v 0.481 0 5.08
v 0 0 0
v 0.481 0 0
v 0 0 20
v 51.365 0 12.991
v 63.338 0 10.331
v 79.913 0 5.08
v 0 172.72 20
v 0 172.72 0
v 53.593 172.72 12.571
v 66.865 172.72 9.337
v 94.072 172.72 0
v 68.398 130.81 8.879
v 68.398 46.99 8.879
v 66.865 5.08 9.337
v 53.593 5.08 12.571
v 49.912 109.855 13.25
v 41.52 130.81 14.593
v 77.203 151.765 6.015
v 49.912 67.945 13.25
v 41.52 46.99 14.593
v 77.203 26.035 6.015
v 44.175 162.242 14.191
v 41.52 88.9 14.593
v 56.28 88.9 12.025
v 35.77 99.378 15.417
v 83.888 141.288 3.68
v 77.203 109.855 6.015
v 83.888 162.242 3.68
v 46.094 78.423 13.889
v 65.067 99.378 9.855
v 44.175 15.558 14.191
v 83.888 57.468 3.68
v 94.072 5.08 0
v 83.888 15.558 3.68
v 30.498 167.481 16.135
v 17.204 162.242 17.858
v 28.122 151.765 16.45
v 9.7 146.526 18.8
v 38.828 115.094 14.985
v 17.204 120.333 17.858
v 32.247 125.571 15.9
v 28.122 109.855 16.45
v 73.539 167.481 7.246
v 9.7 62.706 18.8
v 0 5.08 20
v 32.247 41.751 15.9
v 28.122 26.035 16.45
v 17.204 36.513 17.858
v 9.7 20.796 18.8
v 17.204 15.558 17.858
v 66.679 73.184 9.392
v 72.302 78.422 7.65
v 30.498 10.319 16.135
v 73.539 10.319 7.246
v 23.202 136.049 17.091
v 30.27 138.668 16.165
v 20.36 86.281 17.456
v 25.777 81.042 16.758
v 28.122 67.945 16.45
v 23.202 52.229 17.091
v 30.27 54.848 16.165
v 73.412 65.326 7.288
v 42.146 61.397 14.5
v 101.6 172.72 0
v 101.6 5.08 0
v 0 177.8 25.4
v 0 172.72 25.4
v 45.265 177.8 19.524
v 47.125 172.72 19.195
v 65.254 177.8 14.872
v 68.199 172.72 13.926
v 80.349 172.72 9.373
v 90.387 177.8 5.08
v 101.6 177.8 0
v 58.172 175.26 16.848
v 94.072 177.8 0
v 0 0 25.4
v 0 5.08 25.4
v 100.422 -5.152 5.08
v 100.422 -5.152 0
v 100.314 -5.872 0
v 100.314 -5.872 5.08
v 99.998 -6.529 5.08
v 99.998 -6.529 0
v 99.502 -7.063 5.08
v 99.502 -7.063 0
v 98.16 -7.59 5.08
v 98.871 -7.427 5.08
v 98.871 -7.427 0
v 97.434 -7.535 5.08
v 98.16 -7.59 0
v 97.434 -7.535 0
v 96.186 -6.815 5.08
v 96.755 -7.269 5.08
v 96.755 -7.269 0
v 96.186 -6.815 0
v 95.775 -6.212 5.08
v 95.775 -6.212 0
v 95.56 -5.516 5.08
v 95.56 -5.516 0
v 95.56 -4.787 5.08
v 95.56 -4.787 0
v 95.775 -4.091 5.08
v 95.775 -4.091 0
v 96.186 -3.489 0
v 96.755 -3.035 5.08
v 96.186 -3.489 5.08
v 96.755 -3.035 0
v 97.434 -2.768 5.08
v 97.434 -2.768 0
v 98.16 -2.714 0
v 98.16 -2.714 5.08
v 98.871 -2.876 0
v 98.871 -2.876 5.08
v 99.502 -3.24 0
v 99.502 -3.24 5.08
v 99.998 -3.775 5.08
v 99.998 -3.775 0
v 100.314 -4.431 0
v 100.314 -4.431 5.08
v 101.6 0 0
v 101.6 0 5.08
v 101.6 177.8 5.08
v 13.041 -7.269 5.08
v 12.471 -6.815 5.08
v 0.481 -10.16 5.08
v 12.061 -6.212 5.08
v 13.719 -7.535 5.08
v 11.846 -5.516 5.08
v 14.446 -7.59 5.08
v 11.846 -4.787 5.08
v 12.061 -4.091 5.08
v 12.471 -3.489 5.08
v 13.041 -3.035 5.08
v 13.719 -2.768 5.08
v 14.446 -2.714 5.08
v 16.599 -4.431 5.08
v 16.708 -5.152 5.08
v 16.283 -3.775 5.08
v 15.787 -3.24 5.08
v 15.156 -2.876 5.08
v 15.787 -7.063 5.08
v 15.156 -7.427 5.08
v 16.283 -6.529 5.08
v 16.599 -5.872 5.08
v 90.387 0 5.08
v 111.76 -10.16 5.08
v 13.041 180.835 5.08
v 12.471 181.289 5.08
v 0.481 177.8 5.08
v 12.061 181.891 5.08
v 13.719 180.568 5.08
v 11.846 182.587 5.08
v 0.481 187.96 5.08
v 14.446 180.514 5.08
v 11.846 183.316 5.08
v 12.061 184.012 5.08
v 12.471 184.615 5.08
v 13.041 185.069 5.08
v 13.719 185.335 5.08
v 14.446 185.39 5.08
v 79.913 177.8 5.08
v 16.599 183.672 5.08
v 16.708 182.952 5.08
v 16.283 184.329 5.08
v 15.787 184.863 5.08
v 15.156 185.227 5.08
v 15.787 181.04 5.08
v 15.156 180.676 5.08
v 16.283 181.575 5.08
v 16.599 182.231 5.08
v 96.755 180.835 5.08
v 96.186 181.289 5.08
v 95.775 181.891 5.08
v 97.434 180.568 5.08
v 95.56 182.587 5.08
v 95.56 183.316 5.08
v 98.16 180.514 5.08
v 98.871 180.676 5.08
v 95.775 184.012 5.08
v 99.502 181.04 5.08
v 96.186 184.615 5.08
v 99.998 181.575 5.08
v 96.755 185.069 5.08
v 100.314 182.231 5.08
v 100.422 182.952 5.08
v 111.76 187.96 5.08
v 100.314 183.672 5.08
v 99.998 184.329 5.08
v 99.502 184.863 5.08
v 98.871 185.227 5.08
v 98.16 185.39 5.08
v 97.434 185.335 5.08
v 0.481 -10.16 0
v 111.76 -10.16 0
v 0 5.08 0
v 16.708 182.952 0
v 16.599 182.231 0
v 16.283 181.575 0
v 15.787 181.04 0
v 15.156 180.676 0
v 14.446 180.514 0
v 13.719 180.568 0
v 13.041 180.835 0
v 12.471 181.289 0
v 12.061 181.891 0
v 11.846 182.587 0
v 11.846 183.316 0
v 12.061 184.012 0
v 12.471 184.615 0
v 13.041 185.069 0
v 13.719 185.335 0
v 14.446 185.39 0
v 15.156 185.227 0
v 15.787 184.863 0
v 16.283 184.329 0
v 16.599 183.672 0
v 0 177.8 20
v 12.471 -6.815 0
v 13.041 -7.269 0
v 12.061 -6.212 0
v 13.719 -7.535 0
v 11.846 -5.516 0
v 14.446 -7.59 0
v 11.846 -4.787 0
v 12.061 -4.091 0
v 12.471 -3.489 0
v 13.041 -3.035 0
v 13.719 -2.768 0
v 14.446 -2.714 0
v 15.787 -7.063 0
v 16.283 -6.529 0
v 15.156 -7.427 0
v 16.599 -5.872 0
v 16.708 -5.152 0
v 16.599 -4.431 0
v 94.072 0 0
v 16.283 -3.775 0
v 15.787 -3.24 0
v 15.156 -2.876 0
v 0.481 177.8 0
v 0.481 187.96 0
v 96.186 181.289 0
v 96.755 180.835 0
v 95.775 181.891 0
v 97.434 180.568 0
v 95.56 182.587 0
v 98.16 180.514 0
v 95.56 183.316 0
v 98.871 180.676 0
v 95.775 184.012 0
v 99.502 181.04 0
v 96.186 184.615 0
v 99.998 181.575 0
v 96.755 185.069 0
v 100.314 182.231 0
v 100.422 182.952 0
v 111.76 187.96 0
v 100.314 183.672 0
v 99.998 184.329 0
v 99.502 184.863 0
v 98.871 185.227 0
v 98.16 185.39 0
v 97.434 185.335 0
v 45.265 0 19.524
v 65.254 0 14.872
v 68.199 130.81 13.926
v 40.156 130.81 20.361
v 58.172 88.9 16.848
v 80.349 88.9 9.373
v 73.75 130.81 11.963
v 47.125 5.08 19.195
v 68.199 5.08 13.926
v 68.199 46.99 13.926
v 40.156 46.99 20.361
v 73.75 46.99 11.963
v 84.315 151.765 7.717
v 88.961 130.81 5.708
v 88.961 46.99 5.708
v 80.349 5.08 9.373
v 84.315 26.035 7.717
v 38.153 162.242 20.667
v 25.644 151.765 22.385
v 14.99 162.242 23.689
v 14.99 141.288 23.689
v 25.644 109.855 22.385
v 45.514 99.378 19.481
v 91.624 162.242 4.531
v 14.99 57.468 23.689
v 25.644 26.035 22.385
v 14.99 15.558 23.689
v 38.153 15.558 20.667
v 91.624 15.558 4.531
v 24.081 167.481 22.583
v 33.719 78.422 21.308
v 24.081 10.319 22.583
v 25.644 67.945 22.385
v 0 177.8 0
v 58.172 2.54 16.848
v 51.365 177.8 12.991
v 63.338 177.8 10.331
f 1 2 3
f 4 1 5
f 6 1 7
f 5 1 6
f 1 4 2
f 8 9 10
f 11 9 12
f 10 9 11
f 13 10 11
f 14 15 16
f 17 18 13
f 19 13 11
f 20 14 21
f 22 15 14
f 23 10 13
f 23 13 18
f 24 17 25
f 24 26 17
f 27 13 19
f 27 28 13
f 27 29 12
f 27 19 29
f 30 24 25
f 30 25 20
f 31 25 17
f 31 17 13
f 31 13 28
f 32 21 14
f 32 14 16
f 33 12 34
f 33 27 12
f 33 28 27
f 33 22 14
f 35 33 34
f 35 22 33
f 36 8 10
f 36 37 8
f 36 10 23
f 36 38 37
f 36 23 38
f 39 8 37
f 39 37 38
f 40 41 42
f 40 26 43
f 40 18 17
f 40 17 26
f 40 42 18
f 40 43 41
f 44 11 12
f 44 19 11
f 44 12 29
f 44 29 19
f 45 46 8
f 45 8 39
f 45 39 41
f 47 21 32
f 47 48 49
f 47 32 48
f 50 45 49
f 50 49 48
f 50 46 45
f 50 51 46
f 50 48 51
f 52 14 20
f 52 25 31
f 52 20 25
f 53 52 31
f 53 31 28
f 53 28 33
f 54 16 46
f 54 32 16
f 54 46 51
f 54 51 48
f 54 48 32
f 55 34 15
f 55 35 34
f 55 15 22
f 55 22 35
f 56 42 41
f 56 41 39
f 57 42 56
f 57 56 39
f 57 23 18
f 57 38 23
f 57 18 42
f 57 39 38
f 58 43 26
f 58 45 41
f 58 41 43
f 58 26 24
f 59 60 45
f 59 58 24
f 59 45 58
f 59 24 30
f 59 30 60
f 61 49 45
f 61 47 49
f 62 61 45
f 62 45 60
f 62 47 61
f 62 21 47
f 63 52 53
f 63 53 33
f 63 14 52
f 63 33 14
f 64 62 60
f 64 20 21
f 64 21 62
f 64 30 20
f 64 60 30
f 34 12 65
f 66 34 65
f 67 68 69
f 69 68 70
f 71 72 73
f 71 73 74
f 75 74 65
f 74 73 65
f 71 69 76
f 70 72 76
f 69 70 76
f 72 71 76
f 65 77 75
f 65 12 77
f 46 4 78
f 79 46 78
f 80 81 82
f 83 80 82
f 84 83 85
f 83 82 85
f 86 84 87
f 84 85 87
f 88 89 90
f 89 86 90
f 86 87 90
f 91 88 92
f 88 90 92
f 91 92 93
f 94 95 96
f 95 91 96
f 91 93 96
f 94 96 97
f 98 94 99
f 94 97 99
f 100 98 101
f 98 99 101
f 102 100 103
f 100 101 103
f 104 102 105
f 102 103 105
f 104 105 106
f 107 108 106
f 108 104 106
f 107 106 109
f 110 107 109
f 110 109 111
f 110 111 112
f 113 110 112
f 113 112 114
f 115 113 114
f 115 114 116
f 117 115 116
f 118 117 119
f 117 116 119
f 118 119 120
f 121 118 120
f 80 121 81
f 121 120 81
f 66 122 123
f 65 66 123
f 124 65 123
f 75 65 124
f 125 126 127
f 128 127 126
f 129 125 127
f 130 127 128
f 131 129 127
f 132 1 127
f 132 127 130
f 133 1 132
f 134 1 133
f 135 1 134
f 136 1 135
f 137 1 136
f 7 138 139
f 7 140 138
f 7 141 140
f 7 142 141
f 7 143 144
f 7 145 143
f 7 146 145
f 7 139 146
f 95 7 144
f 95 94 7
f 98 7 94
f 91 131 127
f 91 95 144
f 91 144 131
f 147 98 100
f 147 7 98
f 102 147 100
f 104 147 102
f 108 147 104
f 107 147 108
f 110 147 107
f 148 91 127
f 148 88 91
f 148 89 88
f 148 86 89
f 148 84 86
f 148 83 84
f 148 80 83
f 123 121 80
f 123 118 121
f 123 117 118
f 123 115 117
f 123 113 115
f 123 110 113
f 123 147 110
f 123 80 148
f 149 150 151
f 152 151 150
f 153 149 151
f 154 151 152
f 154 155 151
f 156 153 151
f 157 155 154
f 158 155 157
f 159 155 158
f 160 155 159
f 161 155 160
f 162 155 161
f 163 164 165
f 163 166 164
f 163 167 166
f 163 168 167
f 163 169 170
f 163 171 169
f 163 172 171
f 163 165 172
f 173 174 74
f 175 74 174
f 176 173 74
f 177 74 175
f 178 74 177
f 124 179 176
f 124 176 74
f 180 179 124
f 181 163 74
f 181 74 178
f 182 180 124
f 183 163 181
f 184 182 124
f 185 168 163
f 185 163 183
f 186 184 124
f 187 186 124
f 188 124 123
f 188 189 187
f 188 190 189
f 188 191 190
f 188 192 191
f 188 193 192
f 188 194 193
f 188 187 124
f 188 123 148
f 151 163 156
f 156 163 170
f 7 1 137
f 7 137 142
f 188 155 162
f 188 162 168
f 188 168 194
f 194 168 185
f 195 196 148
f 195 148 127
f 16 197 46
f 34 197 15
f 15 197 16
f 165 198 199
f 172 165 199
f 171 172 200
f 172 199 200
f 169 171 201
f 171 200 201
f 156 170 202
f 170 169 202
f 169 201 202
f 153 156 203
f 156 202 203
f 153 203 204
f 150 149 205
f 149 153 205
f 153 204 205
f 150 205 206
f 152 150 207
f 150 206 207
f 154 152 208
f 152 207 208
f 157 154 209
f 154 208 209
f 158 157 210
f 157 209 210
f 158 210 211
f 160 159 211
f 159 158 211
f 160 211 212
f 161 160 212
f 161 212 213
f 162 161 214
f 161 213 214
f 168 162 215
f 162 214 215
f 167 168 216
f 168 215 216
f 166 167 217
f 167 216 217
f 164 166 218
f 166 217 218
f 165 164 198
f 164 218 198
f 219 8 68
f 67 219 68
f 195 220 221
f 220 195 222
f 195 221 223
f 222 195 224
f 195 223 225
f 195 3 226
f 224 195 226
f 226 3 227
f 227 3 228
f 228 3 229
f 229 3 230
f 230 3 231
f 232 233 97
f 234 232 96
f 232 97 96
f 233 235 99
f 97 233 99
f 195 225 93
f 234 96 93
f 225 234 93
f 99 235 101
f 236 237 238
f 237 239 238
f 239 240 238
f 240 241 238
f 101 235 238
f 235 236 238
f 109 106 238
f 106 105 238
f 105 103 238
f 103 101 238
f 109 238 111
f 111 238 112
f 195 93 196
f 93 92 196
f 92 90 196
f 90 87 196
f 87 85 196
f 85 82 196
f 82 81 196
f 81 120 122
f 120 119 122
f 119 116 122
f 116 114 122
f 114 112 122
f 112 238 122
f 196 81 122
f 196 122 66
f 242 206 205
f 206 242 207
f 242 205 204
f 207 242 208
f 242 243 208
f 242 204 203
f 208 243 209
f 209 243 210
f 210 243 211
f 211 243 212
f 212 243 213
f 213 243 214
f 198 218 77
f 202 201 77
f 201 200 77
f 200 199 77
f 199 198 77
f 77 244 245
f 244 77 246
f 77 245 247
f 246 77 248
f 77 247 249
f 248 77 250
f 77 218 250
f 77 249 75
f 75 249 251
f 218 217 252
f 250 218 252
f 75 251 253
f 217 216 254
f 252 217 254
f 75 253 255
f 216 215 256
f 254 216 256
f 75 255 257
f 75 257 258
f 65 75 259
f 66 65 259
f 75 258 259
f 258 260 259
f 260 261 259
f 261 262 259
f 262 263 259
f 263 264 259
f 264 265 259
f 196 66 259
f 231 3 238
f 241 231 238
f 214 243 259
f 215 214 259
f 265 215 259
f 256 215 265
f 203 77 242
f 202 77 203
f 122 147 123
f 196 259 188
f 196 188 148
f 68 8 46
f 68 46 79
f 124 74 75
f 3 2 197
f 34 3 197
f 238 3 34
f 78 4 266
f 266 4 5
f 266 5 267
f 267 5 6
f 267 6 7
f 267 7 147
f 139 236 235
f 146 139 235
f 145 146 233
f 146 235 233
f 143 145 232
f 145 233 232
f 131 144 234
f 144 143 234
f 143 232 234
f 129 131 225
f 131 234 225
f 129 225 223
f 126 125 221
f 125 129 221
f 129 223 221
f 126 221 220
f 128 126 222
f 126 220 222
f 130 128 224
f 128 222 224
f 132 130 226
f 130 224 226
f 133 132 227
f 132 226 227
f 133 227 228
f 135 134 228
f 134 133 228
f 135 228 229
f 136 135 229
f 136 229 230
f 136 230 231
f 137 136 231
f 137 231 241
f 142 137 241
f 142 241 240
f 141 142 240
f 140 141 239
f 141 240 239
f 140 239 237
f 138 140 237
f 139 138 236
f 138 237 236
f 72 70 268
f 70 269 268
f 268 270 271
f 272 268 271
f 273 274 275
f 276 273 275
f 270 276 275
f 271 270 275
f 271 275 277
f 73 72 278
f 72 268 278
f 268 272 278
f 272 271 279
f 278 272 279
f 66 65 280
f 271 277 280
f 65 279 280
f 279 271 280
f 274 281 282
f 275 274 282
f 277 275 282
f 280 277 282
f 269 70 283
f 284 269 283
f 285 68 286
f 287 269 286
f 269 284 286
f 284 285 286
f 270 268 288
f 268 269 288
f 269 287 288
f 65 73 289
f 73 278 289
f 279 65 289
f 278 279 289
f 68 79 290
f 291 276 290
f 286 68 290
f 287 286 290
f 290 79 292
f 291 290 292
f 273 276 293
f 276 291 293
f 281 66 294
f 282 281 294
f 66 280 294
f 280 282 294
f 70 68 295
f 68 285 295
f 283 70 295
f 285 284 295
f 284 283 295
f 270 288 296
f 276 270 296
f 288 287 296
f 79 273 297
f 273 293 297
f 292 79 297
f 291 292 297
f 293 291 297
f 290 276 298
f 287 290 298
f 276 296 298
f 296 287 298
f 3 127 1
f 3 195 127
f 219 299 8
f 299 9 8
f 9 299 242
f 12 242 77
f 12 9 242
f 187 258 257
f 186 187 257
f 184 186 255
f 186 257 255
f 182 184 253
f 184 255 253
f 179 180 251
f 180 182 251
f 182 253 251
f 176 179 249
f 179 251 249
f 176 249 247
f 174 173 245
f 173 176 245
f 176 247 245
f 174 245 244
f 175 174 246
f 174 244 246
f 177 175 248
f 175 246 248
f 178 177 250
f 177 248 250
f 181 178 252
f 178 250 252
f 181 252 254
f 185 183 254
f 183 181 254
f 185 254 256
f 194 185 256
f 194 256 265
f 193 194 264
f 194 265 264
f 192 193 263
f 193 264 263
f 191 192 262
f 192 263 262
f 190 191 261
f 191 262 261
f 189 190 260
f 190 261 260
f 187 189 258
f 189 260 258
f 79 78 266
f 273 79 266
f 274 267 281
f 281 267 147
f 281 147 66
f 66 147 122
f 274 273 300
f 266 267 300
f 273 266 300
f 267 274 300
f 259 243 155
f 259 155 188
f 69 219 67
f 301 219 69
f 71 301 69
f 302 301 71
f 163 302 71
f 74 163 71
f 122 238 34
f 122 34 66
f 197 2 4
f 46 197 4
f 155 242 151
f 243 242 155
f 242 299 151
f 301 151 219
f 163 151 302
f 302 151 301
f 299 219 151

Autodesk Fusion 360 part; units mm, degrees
sketch "Sketch1" plane through (0, 0, 0) normal (0, 1, 0) x (1, 0, 0)
  line L0 (0, 0) -> (101.6, 0)
  line L1 (0, 0) -> (0, -25.4)
  spline S0 degree 2 poles (0, -25.4) (61.2882, -18.6006) (101.6, 0) knots 0 0 0 10.537877 10.537877 10.537877 weights 1 2.365825 1
  spline S1 degree 2 poles (0, -20) (59.3611, -12.7) (94.0715, 0) knots 0 0 0 9.650073 9.650073 9.650073 weights 1 3 1
  dimension "d1" = 101.6
  dimension "d2" = 25.4
extrude "Extrude1" add sketch "Sketch1" along normal blind 5.08 makes body 1
extrude "Extrude2" add sketch "Sketch1" along normal blind 177.8 separate body contours L0 L1 S0 S1 makes body 2
extrude "Extrude3" add sketch "Sketch1" along normal blind 5.08 from surface at 172.72 separate body makes body 3
sketch "Sketch2" plane through (0, 0, 0) normal (0, 0, 1) x (1, 0, 0)
  line L0 (0.4808, 187.96) -> (111.76, 187.96)
  line L1 (111.76, 187.96) -> (111.76, -10.16)
  line L2 (111.76, -10.16) -> (0.4808, -10.16)
  line L3 (0.4808, -10.16) -> (0.4808, 187.96)
  line L4 (0, 0) -> (0, 177.8)
  line L5 (0, 177.8) -> (101.6, 177.8)
  line L6 (101.6, 0) -> (101.6, 177.8)
  line L7 (0, 0) -> (101.6, 0)
  circle A0 centre (97.9777, -5.1517) radius 2.4447
  line L8 (56.1204, -10.16) -> (56.1204, 187.96) construction
  line L9 (111.76, 88.9) -> (0.4808, 88.9) construction
  circle A1 centre (14.2631, -5.1517) radius 2.4447
  circle A2 centre (97.9777, 182.9517) radius 2.4447
  circle A3 centre (14.2631, 182.9517) radius 2.4447
  dimension "d13" = 10.16
  dimension "d14" = 10.16
  dimension "d15" = 10.16
  dimension "d16" = 4.8895
extrude "Extrude4" add sketch "Sketch2" along normal blind 5.08 separate body contours L0 L1 L2 L3 L5 L6 L7 makes body 4
combine "Combine1" operation add target body 3 tool bodies 4 1 2
